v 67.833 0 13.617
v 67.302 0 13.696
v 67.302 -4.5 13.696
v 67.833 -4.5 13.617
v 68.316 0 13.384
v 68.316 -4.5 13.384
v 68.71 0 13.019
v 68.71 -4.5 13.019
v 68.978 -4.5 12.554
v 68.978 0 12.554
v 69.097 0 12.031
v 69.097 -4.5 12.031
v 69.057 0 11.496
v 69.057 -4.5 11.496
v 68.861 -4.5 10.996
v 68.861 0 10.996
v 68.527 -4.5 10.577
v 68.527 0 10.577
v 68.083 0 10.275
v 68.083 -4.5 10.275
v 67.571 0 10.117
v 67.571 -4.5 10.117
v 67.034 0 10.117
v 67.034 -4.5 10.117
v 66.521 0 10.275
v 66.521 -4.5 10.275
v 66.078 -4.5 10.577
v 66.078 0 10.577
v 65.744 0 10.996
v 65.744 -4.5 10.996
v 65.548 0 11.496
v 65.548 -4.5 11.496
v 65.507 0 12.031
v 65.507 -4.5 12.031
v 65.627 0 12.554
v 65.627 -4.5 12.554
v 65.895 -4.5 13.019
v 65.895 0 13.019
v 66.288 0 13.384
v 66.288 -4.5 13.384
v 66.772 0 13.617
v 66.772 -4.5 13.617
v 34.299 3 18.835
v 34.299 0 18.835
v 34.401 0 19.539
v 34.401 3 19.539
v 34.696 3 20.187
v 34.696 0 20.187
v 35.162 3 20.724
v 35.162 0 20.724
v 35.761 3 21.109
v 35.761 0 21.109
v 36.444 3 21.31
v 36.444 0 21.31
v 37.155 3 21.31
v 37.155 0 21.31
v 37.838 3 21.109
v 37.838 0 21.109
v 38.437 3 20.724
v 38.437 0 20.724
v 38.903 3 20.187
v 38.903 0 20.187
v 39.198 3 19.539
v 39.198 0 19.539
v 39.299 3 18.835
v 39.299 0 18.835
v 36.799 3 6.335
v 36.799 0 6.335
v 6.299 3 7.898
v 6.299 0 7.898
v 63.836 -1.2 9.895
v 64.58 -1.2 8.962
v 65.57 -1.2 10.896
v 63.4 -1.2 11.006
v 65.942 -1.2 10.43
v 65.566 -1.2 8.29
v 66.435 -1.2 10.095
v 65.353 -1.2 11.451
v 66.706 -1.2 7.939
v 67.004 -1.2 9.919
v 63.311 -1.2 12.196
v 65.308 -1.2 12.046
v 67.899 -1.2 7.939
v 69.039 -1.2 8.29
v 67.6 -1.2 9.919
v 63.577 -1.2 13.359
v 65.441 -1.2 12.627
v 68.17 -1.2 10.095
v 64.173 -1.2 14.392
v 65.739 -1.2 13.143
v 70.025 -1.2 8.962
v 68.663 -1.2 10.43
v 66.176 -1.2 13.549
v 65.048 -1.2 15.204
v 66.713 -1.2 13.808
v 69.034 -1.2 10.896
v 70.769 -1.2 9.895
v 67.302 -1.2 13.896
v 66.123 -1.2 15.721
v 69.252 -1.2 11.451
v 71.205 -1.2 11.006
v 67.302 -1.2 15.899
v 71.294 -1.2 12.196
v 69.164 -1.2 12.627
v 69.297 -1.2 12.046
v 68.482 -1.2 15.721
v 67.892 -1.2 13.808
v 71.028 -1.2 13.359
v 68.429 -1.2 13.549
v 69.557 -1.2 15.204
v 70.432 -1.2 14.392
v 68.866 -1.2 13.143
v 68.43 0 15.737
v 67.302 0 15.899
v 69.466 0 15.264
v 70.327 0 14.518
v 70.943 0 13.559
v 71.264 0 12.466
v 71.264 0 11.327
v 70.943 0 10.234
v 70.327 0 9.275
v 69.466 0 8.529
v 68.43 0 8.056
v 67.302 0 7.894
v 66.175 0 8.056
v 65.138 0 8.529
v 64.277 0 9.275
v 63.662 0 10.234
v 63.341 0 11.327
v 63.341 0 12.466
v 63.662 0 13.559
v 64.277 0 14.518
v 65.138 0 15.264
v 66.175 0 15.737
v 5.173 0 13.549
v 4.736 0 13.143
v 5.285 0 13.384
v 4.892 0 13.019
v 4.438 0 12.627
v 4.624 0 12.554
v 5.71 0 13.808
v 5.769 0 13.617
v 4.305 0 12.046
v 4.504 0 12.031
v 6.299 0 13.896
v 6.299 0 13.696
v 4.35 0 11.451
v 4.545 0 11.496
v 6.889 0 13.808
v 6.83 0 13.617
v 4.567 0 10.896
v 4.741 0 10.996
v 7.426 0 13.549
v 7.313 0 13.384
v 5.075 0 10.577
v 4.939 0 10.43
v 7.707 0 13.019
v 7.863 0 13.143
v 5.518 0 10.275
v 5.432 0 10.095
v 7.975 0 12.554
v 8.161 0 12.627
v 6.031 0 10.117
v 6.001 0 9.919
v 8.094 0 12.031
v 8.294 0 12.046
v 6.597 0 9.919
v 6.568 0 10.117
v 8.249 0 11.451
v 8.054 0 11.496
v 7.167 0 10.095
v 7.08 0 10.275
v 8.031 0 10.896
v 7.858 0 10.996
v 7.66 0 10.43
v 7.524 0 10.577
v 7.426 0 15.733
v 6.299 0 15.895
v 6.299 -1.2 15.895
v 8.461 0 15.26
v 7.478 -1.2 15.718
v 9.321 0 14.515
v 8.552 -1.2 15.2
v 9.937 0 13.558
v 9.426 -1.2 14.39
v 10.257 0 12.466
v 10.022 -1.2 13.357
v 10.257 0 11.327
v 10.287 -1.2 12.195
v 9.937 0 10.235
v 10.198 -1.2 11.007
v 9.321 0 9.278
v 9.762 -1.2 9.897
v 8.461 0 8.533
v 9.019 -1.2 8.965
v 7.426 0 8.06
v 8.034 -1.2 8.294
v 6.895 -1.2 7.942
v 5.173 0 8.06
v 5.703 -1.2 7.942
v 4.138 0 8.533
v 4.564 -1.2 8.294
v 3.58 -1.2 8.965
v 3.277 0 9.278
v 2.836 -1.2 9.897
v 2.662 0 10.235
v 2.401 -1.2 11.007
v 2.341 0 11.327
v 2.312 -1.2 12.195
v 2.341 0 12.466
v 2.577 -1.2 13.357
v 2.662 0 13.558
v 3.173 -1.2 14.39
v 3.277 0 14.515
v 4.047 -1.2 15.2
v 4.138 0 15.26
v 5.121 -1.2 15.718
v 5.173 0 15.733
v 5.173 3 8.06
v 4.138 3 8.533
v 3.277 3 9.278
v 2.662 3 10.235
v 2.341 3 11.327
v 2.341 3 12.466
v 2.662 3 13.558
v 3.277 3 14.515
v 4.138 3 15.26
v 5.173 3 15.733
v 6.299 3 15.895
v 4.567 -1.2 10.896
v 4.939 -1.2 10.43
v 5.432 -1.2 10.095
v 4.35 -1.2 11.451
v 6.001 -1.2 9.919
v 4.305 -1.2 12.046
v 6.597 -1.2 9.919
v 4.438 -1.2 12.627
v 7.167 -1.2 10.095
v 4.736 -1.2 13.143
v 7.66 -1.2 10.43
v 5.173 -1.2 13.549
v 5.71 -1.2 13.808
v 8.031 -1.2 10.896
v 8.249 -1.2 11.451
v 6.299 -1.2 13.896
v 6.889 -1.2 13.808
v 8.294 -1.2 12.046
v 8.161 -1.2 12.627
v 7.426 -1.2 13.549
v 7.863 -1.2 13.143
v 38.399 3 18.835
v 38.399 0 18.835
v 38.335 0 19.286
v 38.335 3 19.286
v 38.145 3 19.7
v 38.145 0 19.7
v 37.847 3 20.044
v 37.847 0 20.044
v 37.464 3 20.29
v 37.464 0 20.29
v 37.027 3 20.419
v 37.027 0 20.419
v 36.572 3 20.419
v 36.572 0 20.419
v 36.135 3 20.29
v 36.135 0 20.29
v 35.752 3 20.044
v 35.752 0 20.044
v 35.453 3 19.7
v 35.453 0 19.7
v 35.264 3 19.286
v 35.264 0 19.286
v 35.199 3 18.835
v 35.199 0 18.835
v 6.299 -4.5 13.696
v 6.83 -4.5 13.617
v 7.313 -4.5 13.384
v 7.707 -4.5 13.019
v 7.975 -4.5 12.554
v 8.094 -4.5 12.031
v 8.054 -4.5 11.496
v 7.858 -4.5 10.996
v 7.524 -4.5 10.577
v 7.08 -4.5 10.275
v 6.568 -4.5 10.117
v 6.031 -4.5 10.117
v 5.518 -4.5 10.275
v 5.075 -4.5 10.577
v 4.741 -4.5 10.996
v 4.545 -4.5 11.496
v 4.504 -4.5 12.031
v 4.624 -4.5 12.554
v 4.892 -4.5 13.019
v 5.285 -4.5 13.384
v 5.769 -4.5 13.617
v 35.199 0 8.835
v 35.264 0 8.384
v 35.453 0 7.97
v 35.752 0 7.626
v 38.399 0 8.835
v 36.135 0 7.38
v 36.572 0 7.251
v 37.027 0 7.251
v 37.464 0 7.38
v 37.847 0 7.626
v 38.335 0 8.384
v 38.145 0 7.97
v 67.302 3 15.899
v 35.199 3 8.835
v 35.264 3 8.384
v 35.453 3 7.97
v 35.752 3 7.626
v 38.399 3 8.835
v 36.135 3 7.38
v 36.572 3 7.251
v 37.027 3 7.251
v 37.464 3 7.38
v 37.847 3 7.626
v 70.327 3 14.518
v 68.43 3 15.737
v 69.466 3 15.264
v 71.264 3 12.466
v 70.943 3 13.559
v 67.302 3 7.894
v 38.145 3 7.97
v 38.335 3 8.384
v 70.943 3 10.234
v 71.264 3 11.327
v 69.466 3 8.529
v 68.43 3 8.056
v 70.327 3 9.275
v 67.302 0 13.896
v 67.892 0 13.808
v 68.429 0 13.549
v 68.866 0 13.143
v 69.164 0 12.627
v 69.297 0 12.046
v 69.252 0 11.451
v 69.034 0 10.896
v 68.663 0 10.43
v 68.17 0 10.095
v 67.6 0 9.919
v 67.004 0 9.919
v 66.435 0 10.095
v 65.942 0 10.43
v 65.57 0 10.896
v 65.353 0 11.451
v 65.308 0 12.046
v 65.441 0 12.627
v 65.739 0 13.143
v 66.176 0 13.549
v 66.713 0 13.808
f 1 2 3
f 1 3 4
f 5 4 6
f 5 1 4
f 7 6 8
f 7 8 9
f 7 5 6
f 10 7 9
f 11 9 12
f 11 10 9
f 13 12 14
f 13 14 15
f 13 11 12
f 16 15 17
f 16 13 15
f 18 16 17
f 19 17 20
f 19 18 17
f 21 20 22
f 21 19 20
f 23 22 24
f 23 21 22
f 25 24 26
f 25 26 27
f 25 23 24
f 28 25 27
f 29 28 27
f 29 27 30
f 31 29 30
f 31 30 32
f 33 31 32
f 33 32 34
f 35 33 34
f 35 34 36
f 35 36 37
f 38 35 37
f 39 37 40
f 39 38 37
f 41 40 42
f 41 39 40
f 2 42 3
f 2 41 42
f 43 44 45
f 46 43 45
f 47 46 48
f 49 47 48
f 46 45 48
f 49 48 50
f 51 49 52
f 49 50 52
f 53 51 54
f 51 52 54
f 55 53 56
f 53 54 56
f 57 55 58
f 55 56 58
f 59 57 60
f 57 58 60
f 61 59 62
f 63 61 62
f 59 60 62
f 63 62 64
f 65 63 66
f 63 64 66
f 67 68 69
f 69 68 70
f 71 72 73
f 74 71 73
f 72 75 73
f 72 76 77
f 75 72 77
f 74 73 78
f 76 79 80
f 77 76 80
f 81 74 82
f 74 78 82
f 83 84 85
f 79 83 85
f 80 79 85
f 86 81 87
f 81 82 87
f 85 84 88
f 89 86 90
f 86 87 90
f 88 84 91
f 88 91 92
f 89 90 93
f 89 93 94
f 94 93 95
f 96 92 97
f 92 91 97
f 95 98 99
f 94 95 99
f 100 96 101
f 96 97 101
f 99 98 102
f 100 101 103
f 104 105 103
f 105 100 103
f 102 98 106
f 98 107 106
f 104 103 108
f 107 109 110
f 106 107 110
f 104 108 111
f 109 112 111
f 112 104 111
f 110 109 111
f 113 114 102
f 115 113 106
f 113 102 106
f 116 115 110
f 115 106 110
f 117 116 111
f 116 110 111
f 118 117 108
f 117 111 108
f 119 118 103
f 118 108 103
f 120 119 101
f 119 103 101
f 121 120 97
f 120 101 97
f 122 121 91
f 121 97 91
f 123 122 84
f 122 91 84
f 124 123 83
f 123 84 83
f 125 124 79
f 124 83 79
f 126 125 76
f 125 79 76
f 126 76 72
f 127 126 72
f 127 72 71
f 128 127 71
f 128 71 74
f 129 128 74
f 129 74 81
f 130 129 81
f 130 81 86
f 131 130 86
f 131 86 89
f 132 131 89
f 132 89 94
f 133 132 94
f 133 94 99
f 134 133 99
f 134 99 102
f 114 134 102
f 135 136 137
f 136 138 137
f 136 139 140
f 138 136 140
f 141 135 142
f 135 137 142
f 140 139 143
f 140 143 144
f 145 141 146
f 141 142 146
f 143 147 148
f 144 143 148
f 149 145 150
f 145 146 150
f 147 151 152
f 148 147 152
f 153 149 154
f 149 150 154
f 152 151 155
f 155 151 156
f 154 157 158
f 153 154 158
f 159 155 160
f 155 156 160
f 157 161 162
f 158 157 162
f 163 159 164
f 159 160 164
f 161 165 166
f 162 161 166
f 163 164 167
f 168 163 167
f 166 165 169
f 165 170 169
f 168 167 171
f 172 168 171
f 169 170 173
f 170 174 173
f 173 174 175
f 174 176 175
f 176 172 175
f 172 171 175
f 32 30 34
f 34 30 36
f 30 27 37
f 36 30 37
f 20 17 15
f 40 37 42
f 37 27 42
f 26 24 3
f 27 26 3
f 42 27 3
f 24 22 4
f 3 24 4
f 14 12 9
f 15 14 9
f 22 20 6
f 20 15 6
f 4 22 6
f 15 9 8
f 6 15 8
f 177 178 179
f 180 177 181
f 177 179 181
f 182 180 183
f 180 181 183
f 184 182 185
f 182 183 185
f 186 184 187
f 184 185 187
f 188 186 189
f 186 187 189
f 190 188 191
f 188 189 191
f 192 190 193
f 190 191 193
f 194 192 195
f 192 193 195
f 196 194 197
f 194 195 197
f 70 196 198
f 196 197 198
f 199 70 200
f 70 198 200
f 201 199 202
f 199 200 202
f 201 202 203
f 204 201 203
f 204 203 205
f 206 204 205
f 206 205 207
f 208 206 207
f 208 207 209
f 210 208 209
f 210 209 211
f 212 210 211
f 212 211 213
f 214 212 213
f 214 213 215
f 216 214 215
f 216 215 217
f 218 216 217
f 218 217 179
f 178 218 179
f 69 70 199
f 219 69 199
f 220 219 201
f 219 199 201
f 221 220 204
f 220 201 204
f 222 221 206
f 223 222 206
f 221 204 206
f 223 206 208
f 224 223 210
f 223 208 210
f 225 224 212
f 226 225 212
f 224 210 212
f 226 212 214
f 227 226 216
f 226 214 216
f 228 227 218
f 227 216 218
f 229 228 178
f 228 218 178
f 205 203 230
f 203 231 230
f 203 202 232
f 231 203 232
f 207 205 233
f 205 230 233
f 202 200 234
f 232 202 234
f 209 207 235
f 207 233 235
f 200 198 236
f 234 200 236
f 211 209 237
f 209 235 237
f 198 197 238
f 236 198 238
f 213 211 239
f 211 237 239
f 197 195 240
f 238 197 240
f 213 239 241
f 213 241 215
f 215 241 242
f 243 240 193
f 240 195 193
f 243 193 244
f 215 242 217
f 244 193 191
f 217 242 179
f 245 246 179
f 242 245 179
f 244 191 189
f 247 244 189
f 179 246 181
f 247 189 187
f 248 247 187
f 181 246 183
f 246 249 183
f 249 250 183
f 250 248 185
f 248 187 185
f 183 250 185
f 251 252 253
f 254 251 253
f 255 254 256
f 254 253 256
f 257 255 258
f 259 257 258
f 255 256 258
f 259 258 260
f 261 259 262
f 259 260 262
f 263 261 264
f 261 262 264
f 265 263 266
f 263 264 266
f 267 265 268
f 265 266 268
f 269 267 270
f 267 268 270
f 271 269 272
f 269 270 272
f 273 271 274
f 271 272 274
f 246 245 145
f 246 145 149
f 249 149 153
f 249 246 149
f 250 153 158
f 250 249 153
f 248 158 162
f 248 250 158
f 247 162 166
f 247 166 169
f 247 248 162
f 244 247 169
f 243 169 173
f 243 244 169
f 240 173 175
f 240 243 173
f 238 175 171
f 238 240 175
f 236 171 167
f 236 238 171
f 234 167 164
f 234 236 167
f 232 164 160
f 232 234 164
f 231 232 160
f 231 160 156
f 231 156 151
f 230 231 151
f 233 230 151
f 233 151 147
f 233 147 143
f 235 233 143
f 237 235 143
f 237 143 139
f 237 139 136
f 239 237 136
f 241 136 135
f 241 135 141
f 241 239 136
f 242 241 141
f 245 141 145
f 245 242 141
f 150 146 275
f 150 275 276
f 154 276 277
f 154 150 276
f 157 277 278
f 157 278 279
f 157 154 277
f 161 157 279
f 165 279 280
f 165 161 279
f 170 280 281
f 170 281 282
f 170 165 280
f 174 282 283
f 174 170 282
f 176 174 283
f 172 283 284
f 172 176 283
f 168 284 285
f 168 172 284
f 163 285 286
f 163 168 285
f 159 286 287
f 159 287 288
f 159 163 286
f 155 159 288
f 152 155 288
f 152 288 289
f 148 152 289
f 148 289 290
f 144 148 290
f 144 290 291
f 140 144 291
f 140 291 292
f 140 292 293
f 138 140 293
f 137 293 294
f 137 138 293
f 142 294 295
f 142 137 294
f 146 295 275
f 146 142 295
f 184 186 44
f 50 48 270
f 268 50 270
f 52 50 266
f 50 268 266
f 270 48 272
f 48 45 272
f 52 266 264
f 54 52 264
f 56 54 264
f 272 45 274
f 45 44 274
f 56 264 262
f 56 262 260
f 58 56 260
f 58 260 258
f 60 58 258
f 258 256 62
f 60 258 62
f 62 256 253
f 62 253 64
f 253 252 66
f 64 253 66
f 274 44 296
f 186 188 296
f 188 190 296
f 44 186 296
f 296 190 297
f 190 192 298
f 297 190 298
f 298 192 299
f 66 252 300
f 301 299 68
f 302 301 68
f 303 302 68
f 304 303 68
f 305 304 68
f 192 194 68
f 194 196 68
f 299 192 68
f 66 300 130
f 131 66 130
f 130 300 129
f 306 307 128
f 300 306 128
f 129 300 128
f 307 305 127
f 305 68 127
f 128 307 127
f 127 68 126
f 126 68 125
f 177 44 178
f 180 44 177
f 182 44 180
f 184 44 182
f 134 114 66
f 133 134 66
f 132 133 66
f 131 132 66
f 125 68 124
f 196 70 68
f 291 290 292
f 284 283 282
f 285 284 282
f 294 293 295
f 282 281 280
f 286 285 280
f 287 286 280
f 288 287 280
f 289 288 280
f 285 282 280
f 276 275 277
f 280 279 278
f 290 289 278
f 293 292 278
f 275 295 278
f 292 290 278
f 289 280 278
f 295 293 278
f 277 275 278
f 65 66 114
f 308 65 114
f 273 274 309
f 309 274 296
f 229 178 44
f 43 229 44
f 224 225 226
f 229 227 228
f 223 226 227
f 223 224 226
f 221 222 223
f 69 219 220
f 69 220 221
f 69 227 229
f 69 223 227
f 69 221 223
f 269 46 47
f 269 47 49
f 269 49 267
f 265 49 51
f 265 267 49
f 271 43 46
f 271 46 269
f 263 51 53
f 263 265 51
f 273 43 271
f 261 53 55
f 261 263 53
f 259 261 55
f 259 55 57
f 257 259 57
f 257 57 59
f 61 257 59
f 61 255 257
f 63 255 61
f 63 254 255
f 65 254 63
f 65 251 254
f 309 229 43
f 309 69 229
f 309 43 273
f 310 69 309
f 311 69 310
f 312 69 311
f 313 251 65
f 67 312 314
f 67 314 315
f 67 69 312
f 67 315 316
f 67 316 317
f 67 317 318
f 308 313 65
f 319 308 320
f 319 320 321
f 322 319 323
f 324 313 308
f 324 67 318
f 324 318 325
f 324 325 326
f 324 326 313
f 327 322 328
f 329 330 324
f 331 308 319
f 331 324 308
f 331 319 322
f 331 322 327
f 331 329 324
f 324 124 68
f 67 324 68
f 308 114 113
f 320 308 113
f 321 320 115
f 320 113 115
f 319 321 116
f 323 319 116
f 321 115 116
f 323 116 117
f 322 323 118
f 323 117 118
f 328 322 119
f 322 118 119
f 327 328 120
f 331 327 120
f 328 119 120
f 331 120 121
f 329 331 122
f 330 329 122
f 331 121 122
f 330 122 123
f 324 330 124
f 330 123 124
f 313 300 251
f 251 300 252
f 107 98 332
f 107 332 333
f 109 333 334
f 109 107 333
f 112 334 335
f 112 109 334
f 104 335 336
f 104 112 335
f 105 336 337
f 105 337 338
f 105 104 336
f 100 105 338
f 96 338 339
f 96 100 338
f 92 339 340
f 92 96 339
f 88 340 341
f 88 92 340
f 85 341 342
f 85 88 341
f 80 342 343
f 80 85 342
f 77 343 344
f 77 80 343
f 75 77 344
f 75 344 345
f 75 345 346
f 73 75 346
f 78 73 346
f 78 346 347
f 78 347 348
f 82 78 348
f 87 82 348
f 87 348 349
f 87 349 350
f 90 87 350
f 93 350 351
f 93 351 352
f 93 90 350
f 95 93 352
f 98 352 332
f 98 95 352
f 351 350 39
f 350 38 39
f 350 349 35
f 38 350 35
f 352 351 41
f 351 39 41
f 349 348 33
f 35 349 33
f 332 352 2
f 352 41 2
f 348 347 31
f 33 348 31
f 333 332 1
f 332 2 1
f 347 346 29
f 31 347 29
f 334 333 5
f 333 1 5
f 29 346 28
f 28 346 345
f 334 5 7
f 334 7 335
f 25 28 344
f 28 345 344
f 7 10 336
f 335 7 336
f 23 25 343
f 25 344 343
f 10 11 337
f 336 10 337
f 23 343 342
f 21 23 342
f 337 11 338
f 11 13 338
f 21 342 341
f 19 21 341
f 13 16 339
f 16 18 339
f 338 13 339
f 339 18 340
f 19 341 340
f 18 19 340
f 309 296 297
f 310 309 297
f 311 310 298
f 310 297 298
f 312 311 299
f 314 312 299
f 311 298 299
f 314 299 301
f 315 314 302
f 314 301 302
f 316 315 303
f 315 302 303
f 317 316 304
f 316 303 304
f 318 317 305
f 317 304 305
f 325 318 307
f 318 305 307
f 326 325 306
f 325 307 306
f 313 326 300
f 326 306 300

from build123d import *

# Parameters (mm, degrees)
BOSS_EXTRUDE1_DEPTH = 3
SKETCH1_3_R         = 1.8
BOSS_EXTRUDE2_DEPTH = 4.5
BOSS_EXTRUDE3_START = -1.2
SKETCH1_4_R         = 3.998679456
SKETCH1_4_R_2       = 2
SKETCH1_4_R_3       = 4.002518736
BOSS_EXTRUDE3_DEPTH = 1.2


with BuildPart() as part:
    # Sketch1 → Boss-Extrude1 (new body)
    with BuildSketch(Plane(origin=(0, 0, 0), x_dir=(1, 0, 0), z_dir=(0, 1, 0))):
        with BuildLine():
            Line((6.299371737, -15.895179228), (34.299371737, -18.834953384))
            ThreePointArc((34.299371737, -18.834953384), (36.799371737, -21.334953384), (39.299371737, -18.834953384))
            Line((39.299371737, -18.834953384), (67.302380501, -15.899018508))
            ThreePointArc((67.302380501, -15.899018508), (71.304899237, -11.896499772), (67.302380501, -7.893981036))
            Line((67.302380501, -7.893981036), (36.799371737, -6.334953384))
            Line((36.799371737, -6.334953384), (6.299371737, -7.897820316))
            ThreePointArc((6.299371737, -7.897820316), (2.300692281, -11.896499772), (6.299371737, -15.895179228))
        make_face()
        with BuildLine():
            ThreePointArc((35.199371737, -8.834953384), (36.799371737, -7.234953384), (38.399371737, -8.834953384))
            Line((38.399371737, -8.834953384), (38.399371737, -18.834953384))
            ThreePointArc((38.399371737, -18.834953384), (36.799371737, -20.434953384), (35.199371737, -18.834953384))
            Line((35.199371737, -18.834953384), (35.199371737, -8.834953384))
        make_face(mode=Mode.SUBTRACT)
    extrude(amount=BOSS_EXTRUDE1_DEPTH)

    # Sketch1<3> → Boss-Extrude2 (add)
    with BuildSketch(Plane(origin=(0, 0, 0), x_dir=(1, 0, 0), z_dir=(0, 1, 0))):
        with Locations((67.302380501, -11.896499772)):
            Circle(SKETCH1_3_R)
        with Locations((6.299371737, -11.896499772)):
            Circle(SKETCH1_3_R)
    extrude(amount=-BOSS_EXTRUDE2_DEPTH)

    # Sketch1<4> → Boss-Extrude3 (add)
    # profile 1 of 2: a face of its own
    with BuildSketch(Plane(origin=(0, 0, 0), x_dir=(1, 0, 0), z_dir=(0, 1, 0)).offset(BOSS_EXTRUDE3_START)):
        with Locations((6.299371737, -11.896499772)):
            Circle(SKETCH1_4_R)
        with Locations((6.299371737, -11.896499772)):
            Circle(SKETCH1_4_R_2, mode=Mode.SUBTRACT)
    # profile 2 of 2: a face of its own
    with BuildSketch(Plane(origin=(0, 0, 0), x_dir=(1, 0, 0), z_dir=(0, 1, 0)).offset(BOSS_EXTRUDE3_START)):
        with Locations((67.302380501, -11.896499772)):
            Circle(SKETCH1_4_R_3)
        with Locations((67.302380501, -11.896499772)):
            Circle(SKETCH1_4_R_2, mode=Mode.SUBTRACT)
    extrude(amount=BOSS_EXTRUDE3_DEPTH)


solid = part.part
